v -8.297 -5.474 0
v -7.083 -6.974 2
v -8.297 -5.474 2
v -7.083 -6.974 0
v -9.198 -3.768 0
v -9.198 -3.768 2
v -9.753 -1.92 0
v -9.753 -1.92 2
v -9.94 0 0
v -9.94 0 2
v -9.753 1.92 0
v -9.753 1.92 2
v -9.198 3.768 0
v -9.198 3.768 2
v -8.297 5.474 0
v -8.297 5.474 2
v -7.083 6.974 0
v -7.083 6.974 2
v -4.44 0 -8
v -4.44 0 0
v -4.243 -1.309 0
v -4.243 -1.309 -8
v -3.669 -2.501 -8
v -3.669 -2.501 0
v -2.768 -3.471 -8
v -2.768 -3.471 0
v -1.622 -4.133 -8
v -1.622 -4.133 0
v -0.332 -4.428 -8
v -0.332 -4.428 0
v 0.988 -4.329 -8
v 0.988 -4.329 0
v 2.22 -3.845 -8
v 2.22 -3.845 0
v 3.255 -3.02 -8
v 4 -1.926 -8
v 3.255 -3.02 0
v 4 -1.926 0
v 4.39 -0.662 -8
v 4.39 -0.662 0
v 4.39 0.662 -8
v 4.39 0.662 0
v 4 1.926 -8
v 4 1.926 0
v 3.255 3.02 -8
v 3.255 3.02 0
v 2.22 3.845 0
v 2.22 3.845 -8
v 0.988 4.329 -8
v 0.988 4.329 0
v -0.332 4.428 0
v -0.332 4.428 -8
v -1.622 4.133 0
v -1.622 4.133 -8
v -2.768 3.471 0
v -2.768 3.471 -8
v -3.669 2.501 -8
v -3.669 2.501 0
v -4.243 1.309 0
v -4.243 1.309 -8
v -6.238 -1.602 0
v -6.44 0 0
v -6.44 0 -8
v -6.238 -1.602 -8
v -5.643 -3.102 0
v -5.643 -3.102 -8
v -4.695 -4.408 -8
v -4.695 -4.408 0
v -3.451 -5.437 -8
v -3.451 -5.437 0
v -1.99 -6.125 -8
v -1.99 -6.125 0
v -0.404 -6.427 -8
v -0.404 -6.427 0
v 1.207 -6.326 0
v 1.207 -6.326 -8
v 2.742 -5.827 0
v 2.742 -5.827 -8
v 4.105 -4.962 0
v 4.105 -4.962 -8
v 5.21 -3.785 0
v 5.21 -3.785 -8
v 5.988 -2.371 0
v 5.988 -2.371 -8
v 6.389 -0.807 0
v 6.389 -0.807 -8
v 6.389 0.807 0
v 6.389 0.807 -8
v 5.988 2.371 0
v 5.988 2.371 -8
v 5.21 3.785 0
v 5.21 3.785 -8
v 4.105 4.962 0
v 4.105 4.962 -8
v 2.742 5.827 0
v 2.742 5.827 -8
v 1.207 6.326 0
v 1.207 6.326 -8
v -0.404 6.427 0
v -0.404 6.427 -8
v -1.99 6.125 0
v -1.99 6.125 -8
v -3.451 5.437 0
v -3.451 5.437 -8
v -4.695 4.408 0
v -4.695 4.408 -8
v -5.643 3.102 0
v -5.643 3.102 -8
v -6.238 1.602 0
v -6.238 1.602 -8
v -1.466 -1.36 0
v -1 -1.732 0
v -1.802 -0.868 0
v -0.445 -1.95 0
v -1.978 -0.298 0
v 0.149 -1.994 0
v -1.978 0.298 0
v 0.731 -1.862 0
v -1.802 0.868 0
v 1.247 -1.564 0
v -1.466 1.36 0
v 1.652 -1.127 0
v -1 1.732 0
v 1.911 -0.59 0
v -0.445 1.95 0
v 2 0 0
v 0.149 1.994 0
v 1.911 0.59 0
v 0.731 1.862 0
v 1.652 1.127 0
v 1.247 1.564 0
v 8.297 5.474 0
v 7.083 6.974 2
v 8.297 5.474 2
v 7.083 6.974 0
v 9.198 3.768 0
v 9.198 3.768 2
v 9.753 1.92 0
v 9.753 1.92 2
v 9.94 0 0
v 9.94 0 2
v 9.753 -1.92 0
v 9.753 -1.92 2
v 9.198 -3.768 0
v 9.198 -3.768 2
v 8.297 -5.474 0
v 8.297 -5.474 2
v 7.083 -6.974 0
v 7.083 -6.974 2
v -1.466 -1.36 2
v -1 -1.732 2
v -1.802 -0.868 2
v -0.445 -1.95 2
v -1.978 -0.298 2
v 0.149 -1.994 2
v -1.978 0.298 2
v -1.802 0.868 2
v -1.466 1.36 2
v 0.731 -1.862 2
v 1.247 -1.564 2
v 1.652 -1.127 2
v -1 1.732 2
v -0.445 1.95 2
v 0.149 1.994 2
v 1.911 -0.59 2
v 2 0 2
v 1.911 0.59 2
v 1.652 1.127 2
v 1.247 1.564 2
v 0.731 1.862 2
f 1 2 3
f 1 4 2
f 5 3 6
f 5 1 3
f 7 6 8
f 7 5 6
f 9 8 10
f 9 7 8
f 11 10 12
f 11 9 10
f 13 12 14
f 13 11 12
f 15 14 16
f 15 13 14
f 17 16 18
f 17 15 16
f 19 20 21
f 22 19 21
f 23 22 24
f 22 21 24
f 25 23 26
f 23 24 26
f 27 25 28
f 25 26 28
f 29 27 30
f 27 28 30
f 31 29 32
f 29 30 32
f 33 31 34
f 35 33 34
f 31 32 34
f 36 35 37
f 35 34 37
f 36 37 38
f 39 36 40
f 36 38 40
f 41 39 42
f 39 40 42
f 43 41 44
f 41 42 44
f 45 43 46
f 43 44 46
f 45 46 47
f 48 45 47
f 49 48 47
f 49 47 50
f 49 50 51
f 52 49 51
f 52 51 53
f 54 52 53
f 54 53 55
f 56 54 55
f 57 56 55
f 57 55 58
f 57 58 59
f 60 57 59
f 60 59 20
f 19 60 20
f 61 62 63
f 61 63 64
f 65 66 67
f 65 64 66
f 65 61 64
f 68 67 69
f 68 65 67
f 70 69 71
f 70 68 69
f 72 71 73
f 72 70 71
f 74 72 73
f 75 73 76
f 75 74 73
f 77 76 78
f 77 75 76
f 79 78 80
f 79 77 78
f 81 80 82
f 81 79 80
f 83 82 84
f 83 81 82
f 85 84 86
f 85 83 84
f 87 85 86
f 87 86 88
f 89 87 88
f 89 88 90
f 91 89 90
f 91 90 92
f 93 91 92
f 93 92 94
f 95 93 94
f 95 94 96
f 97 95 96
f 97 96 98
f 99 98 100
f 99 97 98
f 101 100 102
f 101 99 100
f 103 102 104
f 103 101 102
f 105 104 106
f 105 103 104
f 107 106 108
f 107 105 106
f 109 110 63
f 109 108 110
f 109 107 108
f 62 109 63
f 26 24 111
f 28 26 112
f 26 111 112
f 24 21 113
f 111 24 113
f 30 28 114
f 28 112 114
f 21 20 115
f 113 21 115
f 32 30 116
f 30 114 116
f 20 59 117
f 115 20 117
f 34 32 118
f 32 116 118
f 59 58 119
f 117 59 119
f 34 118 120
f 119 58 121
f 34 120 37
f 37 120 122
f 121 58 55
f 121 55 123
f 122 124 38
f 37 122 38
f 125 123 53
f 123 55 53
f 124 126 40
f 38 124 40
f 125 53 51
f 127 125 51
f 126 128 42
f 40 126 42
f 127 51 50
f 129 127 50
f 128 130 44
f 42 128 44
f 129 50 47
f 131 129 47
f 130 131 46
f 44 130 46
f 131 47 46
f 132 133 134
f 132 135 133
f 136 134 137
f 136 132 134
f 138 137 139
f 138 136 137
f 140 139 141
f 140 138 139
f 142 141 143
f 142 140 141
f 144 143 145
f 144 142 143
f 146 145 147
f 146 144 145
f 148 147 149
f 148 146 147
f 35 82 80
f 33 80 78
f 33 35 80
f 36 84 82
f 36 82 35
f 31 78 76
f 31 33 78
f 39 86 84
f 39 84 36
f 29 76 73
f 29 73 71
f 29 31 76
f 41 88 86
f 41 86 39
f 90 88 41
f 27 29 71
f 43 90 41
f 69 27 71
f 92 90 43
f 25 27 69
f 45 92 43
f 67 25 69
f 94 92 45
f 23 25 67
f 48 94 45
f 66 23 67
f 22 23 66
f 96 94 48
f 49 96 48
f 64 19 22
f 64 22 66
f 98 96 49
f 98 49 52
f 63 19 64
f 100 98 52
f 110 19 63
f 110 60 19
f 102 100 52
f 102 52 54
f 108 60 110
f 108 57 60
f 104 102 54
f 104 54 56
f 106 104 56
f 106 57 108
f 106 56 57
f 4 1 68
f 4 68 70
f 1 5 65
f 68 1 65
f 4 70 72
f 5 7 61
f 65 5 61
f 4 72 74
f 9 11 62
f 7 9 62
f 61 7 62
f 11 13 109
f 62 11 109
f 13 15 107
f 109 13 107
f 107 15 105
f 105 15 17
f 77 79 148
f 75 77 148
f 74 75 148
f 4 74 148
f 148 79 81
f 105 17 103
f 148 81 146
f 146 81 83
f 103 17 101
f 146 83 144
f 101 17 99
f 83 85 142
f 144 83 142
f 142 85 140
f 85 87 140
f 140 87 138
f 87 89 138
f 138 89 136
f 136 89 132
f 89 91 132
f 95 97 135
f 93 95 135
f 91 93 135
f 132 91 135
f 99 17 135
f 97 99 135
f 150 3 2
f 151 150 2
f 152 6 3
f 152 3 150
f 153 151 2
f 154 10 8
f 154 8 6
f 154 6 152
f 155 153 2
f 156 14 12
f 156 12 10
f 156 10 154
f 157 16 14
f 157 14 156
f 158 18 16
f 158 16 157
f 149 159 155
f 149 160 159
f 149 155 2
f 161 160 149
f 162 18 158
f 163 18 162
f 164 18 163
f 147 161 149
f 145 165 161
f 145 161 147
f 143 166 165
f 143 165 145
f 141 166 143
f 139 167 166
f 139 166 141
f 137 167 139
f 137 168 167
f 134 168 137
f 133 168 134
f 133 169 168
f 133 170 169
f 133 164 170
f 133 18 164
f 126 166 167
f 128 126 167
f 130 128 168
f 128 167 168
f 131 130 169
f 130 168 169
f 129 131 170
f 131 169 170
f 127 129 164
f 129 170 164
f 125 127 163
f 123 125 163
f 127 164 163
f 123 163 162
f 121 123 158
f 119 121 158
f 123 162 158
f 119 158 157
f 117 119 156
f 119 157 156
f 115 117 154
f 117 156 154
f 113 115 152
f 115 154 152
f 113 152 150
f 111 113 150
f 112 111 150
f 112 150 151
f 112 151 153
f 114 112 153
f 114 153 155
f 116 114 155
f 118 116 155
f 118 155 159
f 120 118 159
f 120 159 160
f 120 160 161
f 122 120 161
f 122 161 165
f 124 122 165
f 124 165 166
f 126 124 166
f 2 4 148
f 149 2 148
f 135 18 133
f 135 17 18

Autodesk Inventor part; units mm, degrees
ref_plane "YZ Plane" through (0, 0, 0) normal (1, 0, 0) x (0, 1, 0)
ref_plane "XZ Plane" through (0, 0, 0) normal (0, 1, 0) x (-1, 0, 0)
ref_plane "XY Plane" through (0, 0, 0) normal (0, 0, 1) x (1, 0, 0)
ref_plane "Work Plane1" through (0, 0, 0) normal (0, 0, 1) x (1, 0, 0)
sketch "Sketch1" plane through (0, 0, 0) normal (0, 0, 1) x (1, 0, 0)
  arc A0 (-11, 8.1244) -> (-11, -8.1244) centre (0, 0) ccw construction
  line L0 (-11, -8.1244) -> (-11, -24.74) construction
  line L1 (-11, -24.74) -> (11, -24.74) construction
  line L2 (11, -24.74) -> (11, -8.1244) construction
  arc A1 (11, -8.1244) -> (11, 8.1244) centre (0, 0) ccw construction
  line L3 (11, 24.74) -> (11, 8.1244) construction
  line L4 (-11, 24.74) -> (11, 24.74) construction
  line L5 (-11, 8.1244) -> (-11, 24.74) construction
  line L6 (-7.0828, 6.9741) -> (7.0828, 6.9741)
  line L7 (-7.0828, -6.9741) -> (7.0828, -6.9741)
  arc A2 (-7.0828, 6.9741) -> (-7.0828, -6.9741) centre (0, 0) ccw
  arc A3 (7.0828, -6.9741) -> (7.0828, 6.9741) centre (0, 0) ccw
  arc A4 (-3.5454, 3.44) -> (-3.5454, -3.44) centre (0, 0) ccw projected
  line L8 (-3.5454, 3.44) -> (-1.1656, 3.44) projected
  line L9 (-1.1656, 3.44) -> (-1.1656, 4.44) projected
  line L10 (-1.1656, 4.44) -> (-2.5, 4.44) projected
  line L11 (-2.5, 4.44) -> (-2.5, 5.44) projected
  line L12 (-2.5, 5.44) -> (2.5, 5.44) projected
  line L13 (2.5, 5.44) -> (2.5, 4.44) projected
  line L14 (2.5, 4.44) -> (1.1656, 4.44) projected
  line L15 (1.1656, 4.44) -> (1.1656, 3.44) projected
  line L16 (1.1656, 3.44) -> (3.5454, 3.44) projected
  arc A5 (3.5454, -3.44) -> (3.5454, 3.44) centre (0, 0) ccw projected
  line L17 (1.1656, -3.44) -> (3.5454, -3.44) projected
  line L18 (1.1656, -4.44) -> (1.1656, -3.44) projected
  line L19 (1.1656, -4.44) -> (2.5, -4.44) projected
  line L20 (2.5, -4.44) -> (2.5, -5.44) projected
  line L21 (2.5, -5.44) -> (-2.5, -5.44) projected
  line L22 (-2.5, -5.44) -> (-2.5, -4.44) projected
  line L23 (-1.1656, -4.44) -> (-2.5, -4.44) projected
  line L24 (-1.1656, -3.44) -> (-1.1656, -4.44) projected
  line L25 (-3.5454, -3.44) -> (-1.1656, -3.44) projected
  point P0 (0, 0)
extrude "Extrusion1" add sketch "Sketch1" along normal blind 2 contours L6 A3 L7 A2 | L8 L9 L10 L11 L12 L13 L14 L15 L16 A5 L17 L18 L19 L20 L21 L22 L23 L24 L25 A4
sketch "Sketch2" plane through (0, 0, 0) normal (0, 0, -1) x (-1, 0, 0)
  arc A0 (11, -8.1244) -> (11, 8.1244) centre (0, 0) ccw construction
  line L0 (11, -8.1244) -> (11, -24.74) construction
  line L1 (11, -24.74) -> (-11, -24.74) construction
  line L2 (-11, -24.74) -> (-11, -8.1244) construction
  arc A1 (-11, 8.1244) -> (-11, -8.1244) centre (0, 0) ccw construction
  line L3 (-11, 24.74) -> (-11, 8.1244) construction
  line L4 (11, 24.74) -> (-11, 24.74) construction
  line L5 (11, 8.1244) -> (11, 24.74) construction
  circle A2 centre (0, 0) radius 6.44
  circle A3 centre (0, 0) radius 4.44
  arc A4 (3.5454, -3.44) -> (3.5454, 3.44) centre (0, 0) ccw projected
  line L6 (3.5454, 3.44) -> (1.1656, 3.44) projected
  line L7 (1.1656, 3.44) -> (1.1656, 4.44) projected
  line L8 (1.1656, 4.44) -> (2.5, 4.44) projected
  line L9 (2.5, 4.44) -> (2.5, 5.44) projected
  line L10 (2.5, 5.44) -> (-2.5, 5.44) projected
  line L11 (-2.5, 5.44) -> (-2.5, 4.44) projected
  line L12 (-2.5, 4.44) -> (-1.1656, 4.44) projected
  line L13 (-1.1656, 4.44) -> (-1.1656, 3.44) projected
  line L14 (-1.1656, 3.44) -> (-3.5454, 3.44) projected
  arc A5 (-3.5454, 3.44) -> (-3.5454, -3.44) centre (0, 0) ccw projected
  line L15 (-1.1656, -3.44) -> (-3.5454, -3.44) projected
  line L16 (-1.1656, -4.44) -> (-1.1656, -3.44) projected
  line L17 (-1.1656, -4.44) -> (-2.5, -4.44) projected
  line L18 (-2.5, -4.44) -> (-2.5, -5.44) projected
  line L19 (-2.5, -5.44) -> (2.5, -5.44) projected
  line L20 (2.5, -5.44) -> (2.5, -4.44) projected
  line L21 (1.1656, -4.44) -> (2.5, -4.44) projected
  line L22 (1.1656, -3.44) -> (1.1656, -4.44) projected
  line L23 (3.5454, -3.44) -> (1.1656, -3.44) projected
  dimension "d6" = 2
extrude "Extrusion2" add sketch "Sketch2" along normal blind 8 contours A2 | A3 L6 A4 L23 | A3 L13 L12 L11 L10 L9 L8 L7 | L22 L21 L20 L19 L18 L17 L16 A3 | A3 L15 A5 L14
sketch "Sketch3" plane through (0, 0, 2) normal (0, 0, 1) x (1, 0, 0)
  arc A0 (7.0828, -6.9741) -> (7.0828, 6.9741) centre (0, 0) ccw projected
  circle A1 centre (0, 0) radius 2
extrude "Extrusion3" cut sketch "Sketch3" against normal through all
properties part number "ECoG_holder_cap"
